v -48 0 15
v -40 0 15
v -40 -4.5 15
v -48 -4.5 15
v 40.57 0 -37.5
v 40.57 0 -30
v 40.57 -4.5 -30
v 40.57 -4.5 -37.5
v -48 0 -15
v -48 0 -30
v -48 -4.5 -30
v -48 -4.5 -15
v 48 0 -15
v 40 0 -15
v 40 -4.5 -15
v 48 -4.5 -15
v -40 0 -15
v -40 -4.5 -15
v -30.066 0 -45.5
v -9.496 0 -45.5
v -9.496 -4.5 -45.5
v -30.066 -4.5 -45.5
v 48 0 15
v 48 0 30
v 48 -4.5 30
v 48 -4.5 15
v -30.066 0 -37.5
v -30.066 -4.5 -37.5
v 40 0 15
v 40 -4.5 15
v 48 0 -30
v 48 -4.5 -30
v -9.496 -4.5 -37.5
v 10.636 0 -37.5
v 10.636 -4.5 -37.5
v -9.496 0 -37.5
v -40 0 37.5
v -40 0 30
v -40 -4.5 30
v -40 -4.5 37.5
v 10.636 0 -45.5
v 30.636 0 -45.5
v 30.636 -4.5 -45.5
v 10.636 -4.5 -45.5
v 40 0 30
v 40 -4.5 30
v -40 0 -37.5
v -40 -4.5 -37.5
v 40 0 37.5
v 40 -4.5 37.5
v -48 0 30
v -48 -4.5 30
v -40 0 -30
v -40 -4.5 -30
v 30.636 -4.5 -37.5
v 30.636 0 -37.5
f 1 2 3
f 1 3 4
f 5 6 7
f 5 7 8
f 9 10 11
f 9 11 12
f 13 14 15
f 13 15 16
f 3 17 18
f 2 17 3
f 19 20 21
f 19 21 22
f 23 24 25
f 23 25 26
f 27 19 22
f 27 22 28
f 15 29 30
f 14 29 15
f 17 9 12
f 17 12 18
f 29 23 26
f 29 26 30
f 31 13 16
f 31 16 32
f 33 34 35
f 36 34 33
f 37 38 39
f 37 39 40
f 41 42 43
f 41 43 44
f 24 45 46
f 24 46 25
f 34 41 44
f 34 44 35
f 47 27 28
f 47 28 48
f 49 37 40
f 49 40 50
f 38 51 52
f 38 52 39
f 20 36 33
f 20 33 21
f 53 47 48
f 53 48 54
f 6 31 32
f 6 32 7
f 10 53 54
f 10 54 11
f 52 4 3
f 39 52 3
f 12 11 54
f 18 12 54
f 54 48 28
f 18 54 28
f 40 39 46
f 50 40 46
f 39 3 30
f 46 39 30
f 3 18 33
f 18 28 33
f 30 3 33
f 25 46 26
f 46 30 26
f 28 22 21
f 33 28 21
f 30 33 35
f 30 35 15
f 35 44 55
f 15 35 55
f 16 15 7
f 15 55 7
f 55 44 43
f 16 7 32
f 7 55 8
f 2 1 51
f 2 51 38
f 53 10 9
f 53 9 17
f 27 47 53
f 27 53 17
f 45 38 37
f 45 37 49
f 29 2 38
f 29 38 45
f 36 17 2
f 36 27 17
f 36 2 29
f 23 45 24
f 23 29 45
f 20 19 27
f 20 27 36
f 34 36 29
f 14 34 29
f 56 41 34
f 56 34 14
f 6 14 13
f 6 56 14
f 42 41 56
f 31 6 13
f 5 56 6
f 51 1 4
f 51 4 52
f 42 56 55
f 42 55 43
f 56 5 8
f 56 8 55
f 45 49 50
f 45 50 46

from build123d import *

# Parameters (mm, degrees)
BOSS_EXTRUDE1_DEPTH = 4.5


with BuildPart() as part:
    # Sketch1 → Boss-Extrude1 (new body)
    with BuildSketch(Plane(origin=(0, 0, 0), x_dir=(1, 0, 0), z_dir=(0, 1, 0))):
        Polygon((-30.066262521, 37.5), (-40, 37.5), (-40, 30), (-48, 30), (-48, 15), (-40, 15), (-40, 12.5), (-40, -15), (-48, -15), (-48, -30), (-40, -30), (-40, -32.5), (-40, -34.271597524), (-40, -37.5), (40, -37.5), (40, -32.5), (40, -30), (48, -30), (48, -17.5), (48, -15), (40, -15), (40, 12.5), (40, 15), (48, 15), (48, 30), (40.57, 30), (40.57, 37.5), (30.636262521, 37.5), (30.636262521, 45.5), (10.636262521, 45.5), (10.636262521, 37.5), (-9.496262521, 37.5), (-9.496262521, 45.5), (-30.066262521, 45.5), align=None)
    extrude(amount=-BOSS_EXTRUDE1_DEPTH)


solid = part.part
